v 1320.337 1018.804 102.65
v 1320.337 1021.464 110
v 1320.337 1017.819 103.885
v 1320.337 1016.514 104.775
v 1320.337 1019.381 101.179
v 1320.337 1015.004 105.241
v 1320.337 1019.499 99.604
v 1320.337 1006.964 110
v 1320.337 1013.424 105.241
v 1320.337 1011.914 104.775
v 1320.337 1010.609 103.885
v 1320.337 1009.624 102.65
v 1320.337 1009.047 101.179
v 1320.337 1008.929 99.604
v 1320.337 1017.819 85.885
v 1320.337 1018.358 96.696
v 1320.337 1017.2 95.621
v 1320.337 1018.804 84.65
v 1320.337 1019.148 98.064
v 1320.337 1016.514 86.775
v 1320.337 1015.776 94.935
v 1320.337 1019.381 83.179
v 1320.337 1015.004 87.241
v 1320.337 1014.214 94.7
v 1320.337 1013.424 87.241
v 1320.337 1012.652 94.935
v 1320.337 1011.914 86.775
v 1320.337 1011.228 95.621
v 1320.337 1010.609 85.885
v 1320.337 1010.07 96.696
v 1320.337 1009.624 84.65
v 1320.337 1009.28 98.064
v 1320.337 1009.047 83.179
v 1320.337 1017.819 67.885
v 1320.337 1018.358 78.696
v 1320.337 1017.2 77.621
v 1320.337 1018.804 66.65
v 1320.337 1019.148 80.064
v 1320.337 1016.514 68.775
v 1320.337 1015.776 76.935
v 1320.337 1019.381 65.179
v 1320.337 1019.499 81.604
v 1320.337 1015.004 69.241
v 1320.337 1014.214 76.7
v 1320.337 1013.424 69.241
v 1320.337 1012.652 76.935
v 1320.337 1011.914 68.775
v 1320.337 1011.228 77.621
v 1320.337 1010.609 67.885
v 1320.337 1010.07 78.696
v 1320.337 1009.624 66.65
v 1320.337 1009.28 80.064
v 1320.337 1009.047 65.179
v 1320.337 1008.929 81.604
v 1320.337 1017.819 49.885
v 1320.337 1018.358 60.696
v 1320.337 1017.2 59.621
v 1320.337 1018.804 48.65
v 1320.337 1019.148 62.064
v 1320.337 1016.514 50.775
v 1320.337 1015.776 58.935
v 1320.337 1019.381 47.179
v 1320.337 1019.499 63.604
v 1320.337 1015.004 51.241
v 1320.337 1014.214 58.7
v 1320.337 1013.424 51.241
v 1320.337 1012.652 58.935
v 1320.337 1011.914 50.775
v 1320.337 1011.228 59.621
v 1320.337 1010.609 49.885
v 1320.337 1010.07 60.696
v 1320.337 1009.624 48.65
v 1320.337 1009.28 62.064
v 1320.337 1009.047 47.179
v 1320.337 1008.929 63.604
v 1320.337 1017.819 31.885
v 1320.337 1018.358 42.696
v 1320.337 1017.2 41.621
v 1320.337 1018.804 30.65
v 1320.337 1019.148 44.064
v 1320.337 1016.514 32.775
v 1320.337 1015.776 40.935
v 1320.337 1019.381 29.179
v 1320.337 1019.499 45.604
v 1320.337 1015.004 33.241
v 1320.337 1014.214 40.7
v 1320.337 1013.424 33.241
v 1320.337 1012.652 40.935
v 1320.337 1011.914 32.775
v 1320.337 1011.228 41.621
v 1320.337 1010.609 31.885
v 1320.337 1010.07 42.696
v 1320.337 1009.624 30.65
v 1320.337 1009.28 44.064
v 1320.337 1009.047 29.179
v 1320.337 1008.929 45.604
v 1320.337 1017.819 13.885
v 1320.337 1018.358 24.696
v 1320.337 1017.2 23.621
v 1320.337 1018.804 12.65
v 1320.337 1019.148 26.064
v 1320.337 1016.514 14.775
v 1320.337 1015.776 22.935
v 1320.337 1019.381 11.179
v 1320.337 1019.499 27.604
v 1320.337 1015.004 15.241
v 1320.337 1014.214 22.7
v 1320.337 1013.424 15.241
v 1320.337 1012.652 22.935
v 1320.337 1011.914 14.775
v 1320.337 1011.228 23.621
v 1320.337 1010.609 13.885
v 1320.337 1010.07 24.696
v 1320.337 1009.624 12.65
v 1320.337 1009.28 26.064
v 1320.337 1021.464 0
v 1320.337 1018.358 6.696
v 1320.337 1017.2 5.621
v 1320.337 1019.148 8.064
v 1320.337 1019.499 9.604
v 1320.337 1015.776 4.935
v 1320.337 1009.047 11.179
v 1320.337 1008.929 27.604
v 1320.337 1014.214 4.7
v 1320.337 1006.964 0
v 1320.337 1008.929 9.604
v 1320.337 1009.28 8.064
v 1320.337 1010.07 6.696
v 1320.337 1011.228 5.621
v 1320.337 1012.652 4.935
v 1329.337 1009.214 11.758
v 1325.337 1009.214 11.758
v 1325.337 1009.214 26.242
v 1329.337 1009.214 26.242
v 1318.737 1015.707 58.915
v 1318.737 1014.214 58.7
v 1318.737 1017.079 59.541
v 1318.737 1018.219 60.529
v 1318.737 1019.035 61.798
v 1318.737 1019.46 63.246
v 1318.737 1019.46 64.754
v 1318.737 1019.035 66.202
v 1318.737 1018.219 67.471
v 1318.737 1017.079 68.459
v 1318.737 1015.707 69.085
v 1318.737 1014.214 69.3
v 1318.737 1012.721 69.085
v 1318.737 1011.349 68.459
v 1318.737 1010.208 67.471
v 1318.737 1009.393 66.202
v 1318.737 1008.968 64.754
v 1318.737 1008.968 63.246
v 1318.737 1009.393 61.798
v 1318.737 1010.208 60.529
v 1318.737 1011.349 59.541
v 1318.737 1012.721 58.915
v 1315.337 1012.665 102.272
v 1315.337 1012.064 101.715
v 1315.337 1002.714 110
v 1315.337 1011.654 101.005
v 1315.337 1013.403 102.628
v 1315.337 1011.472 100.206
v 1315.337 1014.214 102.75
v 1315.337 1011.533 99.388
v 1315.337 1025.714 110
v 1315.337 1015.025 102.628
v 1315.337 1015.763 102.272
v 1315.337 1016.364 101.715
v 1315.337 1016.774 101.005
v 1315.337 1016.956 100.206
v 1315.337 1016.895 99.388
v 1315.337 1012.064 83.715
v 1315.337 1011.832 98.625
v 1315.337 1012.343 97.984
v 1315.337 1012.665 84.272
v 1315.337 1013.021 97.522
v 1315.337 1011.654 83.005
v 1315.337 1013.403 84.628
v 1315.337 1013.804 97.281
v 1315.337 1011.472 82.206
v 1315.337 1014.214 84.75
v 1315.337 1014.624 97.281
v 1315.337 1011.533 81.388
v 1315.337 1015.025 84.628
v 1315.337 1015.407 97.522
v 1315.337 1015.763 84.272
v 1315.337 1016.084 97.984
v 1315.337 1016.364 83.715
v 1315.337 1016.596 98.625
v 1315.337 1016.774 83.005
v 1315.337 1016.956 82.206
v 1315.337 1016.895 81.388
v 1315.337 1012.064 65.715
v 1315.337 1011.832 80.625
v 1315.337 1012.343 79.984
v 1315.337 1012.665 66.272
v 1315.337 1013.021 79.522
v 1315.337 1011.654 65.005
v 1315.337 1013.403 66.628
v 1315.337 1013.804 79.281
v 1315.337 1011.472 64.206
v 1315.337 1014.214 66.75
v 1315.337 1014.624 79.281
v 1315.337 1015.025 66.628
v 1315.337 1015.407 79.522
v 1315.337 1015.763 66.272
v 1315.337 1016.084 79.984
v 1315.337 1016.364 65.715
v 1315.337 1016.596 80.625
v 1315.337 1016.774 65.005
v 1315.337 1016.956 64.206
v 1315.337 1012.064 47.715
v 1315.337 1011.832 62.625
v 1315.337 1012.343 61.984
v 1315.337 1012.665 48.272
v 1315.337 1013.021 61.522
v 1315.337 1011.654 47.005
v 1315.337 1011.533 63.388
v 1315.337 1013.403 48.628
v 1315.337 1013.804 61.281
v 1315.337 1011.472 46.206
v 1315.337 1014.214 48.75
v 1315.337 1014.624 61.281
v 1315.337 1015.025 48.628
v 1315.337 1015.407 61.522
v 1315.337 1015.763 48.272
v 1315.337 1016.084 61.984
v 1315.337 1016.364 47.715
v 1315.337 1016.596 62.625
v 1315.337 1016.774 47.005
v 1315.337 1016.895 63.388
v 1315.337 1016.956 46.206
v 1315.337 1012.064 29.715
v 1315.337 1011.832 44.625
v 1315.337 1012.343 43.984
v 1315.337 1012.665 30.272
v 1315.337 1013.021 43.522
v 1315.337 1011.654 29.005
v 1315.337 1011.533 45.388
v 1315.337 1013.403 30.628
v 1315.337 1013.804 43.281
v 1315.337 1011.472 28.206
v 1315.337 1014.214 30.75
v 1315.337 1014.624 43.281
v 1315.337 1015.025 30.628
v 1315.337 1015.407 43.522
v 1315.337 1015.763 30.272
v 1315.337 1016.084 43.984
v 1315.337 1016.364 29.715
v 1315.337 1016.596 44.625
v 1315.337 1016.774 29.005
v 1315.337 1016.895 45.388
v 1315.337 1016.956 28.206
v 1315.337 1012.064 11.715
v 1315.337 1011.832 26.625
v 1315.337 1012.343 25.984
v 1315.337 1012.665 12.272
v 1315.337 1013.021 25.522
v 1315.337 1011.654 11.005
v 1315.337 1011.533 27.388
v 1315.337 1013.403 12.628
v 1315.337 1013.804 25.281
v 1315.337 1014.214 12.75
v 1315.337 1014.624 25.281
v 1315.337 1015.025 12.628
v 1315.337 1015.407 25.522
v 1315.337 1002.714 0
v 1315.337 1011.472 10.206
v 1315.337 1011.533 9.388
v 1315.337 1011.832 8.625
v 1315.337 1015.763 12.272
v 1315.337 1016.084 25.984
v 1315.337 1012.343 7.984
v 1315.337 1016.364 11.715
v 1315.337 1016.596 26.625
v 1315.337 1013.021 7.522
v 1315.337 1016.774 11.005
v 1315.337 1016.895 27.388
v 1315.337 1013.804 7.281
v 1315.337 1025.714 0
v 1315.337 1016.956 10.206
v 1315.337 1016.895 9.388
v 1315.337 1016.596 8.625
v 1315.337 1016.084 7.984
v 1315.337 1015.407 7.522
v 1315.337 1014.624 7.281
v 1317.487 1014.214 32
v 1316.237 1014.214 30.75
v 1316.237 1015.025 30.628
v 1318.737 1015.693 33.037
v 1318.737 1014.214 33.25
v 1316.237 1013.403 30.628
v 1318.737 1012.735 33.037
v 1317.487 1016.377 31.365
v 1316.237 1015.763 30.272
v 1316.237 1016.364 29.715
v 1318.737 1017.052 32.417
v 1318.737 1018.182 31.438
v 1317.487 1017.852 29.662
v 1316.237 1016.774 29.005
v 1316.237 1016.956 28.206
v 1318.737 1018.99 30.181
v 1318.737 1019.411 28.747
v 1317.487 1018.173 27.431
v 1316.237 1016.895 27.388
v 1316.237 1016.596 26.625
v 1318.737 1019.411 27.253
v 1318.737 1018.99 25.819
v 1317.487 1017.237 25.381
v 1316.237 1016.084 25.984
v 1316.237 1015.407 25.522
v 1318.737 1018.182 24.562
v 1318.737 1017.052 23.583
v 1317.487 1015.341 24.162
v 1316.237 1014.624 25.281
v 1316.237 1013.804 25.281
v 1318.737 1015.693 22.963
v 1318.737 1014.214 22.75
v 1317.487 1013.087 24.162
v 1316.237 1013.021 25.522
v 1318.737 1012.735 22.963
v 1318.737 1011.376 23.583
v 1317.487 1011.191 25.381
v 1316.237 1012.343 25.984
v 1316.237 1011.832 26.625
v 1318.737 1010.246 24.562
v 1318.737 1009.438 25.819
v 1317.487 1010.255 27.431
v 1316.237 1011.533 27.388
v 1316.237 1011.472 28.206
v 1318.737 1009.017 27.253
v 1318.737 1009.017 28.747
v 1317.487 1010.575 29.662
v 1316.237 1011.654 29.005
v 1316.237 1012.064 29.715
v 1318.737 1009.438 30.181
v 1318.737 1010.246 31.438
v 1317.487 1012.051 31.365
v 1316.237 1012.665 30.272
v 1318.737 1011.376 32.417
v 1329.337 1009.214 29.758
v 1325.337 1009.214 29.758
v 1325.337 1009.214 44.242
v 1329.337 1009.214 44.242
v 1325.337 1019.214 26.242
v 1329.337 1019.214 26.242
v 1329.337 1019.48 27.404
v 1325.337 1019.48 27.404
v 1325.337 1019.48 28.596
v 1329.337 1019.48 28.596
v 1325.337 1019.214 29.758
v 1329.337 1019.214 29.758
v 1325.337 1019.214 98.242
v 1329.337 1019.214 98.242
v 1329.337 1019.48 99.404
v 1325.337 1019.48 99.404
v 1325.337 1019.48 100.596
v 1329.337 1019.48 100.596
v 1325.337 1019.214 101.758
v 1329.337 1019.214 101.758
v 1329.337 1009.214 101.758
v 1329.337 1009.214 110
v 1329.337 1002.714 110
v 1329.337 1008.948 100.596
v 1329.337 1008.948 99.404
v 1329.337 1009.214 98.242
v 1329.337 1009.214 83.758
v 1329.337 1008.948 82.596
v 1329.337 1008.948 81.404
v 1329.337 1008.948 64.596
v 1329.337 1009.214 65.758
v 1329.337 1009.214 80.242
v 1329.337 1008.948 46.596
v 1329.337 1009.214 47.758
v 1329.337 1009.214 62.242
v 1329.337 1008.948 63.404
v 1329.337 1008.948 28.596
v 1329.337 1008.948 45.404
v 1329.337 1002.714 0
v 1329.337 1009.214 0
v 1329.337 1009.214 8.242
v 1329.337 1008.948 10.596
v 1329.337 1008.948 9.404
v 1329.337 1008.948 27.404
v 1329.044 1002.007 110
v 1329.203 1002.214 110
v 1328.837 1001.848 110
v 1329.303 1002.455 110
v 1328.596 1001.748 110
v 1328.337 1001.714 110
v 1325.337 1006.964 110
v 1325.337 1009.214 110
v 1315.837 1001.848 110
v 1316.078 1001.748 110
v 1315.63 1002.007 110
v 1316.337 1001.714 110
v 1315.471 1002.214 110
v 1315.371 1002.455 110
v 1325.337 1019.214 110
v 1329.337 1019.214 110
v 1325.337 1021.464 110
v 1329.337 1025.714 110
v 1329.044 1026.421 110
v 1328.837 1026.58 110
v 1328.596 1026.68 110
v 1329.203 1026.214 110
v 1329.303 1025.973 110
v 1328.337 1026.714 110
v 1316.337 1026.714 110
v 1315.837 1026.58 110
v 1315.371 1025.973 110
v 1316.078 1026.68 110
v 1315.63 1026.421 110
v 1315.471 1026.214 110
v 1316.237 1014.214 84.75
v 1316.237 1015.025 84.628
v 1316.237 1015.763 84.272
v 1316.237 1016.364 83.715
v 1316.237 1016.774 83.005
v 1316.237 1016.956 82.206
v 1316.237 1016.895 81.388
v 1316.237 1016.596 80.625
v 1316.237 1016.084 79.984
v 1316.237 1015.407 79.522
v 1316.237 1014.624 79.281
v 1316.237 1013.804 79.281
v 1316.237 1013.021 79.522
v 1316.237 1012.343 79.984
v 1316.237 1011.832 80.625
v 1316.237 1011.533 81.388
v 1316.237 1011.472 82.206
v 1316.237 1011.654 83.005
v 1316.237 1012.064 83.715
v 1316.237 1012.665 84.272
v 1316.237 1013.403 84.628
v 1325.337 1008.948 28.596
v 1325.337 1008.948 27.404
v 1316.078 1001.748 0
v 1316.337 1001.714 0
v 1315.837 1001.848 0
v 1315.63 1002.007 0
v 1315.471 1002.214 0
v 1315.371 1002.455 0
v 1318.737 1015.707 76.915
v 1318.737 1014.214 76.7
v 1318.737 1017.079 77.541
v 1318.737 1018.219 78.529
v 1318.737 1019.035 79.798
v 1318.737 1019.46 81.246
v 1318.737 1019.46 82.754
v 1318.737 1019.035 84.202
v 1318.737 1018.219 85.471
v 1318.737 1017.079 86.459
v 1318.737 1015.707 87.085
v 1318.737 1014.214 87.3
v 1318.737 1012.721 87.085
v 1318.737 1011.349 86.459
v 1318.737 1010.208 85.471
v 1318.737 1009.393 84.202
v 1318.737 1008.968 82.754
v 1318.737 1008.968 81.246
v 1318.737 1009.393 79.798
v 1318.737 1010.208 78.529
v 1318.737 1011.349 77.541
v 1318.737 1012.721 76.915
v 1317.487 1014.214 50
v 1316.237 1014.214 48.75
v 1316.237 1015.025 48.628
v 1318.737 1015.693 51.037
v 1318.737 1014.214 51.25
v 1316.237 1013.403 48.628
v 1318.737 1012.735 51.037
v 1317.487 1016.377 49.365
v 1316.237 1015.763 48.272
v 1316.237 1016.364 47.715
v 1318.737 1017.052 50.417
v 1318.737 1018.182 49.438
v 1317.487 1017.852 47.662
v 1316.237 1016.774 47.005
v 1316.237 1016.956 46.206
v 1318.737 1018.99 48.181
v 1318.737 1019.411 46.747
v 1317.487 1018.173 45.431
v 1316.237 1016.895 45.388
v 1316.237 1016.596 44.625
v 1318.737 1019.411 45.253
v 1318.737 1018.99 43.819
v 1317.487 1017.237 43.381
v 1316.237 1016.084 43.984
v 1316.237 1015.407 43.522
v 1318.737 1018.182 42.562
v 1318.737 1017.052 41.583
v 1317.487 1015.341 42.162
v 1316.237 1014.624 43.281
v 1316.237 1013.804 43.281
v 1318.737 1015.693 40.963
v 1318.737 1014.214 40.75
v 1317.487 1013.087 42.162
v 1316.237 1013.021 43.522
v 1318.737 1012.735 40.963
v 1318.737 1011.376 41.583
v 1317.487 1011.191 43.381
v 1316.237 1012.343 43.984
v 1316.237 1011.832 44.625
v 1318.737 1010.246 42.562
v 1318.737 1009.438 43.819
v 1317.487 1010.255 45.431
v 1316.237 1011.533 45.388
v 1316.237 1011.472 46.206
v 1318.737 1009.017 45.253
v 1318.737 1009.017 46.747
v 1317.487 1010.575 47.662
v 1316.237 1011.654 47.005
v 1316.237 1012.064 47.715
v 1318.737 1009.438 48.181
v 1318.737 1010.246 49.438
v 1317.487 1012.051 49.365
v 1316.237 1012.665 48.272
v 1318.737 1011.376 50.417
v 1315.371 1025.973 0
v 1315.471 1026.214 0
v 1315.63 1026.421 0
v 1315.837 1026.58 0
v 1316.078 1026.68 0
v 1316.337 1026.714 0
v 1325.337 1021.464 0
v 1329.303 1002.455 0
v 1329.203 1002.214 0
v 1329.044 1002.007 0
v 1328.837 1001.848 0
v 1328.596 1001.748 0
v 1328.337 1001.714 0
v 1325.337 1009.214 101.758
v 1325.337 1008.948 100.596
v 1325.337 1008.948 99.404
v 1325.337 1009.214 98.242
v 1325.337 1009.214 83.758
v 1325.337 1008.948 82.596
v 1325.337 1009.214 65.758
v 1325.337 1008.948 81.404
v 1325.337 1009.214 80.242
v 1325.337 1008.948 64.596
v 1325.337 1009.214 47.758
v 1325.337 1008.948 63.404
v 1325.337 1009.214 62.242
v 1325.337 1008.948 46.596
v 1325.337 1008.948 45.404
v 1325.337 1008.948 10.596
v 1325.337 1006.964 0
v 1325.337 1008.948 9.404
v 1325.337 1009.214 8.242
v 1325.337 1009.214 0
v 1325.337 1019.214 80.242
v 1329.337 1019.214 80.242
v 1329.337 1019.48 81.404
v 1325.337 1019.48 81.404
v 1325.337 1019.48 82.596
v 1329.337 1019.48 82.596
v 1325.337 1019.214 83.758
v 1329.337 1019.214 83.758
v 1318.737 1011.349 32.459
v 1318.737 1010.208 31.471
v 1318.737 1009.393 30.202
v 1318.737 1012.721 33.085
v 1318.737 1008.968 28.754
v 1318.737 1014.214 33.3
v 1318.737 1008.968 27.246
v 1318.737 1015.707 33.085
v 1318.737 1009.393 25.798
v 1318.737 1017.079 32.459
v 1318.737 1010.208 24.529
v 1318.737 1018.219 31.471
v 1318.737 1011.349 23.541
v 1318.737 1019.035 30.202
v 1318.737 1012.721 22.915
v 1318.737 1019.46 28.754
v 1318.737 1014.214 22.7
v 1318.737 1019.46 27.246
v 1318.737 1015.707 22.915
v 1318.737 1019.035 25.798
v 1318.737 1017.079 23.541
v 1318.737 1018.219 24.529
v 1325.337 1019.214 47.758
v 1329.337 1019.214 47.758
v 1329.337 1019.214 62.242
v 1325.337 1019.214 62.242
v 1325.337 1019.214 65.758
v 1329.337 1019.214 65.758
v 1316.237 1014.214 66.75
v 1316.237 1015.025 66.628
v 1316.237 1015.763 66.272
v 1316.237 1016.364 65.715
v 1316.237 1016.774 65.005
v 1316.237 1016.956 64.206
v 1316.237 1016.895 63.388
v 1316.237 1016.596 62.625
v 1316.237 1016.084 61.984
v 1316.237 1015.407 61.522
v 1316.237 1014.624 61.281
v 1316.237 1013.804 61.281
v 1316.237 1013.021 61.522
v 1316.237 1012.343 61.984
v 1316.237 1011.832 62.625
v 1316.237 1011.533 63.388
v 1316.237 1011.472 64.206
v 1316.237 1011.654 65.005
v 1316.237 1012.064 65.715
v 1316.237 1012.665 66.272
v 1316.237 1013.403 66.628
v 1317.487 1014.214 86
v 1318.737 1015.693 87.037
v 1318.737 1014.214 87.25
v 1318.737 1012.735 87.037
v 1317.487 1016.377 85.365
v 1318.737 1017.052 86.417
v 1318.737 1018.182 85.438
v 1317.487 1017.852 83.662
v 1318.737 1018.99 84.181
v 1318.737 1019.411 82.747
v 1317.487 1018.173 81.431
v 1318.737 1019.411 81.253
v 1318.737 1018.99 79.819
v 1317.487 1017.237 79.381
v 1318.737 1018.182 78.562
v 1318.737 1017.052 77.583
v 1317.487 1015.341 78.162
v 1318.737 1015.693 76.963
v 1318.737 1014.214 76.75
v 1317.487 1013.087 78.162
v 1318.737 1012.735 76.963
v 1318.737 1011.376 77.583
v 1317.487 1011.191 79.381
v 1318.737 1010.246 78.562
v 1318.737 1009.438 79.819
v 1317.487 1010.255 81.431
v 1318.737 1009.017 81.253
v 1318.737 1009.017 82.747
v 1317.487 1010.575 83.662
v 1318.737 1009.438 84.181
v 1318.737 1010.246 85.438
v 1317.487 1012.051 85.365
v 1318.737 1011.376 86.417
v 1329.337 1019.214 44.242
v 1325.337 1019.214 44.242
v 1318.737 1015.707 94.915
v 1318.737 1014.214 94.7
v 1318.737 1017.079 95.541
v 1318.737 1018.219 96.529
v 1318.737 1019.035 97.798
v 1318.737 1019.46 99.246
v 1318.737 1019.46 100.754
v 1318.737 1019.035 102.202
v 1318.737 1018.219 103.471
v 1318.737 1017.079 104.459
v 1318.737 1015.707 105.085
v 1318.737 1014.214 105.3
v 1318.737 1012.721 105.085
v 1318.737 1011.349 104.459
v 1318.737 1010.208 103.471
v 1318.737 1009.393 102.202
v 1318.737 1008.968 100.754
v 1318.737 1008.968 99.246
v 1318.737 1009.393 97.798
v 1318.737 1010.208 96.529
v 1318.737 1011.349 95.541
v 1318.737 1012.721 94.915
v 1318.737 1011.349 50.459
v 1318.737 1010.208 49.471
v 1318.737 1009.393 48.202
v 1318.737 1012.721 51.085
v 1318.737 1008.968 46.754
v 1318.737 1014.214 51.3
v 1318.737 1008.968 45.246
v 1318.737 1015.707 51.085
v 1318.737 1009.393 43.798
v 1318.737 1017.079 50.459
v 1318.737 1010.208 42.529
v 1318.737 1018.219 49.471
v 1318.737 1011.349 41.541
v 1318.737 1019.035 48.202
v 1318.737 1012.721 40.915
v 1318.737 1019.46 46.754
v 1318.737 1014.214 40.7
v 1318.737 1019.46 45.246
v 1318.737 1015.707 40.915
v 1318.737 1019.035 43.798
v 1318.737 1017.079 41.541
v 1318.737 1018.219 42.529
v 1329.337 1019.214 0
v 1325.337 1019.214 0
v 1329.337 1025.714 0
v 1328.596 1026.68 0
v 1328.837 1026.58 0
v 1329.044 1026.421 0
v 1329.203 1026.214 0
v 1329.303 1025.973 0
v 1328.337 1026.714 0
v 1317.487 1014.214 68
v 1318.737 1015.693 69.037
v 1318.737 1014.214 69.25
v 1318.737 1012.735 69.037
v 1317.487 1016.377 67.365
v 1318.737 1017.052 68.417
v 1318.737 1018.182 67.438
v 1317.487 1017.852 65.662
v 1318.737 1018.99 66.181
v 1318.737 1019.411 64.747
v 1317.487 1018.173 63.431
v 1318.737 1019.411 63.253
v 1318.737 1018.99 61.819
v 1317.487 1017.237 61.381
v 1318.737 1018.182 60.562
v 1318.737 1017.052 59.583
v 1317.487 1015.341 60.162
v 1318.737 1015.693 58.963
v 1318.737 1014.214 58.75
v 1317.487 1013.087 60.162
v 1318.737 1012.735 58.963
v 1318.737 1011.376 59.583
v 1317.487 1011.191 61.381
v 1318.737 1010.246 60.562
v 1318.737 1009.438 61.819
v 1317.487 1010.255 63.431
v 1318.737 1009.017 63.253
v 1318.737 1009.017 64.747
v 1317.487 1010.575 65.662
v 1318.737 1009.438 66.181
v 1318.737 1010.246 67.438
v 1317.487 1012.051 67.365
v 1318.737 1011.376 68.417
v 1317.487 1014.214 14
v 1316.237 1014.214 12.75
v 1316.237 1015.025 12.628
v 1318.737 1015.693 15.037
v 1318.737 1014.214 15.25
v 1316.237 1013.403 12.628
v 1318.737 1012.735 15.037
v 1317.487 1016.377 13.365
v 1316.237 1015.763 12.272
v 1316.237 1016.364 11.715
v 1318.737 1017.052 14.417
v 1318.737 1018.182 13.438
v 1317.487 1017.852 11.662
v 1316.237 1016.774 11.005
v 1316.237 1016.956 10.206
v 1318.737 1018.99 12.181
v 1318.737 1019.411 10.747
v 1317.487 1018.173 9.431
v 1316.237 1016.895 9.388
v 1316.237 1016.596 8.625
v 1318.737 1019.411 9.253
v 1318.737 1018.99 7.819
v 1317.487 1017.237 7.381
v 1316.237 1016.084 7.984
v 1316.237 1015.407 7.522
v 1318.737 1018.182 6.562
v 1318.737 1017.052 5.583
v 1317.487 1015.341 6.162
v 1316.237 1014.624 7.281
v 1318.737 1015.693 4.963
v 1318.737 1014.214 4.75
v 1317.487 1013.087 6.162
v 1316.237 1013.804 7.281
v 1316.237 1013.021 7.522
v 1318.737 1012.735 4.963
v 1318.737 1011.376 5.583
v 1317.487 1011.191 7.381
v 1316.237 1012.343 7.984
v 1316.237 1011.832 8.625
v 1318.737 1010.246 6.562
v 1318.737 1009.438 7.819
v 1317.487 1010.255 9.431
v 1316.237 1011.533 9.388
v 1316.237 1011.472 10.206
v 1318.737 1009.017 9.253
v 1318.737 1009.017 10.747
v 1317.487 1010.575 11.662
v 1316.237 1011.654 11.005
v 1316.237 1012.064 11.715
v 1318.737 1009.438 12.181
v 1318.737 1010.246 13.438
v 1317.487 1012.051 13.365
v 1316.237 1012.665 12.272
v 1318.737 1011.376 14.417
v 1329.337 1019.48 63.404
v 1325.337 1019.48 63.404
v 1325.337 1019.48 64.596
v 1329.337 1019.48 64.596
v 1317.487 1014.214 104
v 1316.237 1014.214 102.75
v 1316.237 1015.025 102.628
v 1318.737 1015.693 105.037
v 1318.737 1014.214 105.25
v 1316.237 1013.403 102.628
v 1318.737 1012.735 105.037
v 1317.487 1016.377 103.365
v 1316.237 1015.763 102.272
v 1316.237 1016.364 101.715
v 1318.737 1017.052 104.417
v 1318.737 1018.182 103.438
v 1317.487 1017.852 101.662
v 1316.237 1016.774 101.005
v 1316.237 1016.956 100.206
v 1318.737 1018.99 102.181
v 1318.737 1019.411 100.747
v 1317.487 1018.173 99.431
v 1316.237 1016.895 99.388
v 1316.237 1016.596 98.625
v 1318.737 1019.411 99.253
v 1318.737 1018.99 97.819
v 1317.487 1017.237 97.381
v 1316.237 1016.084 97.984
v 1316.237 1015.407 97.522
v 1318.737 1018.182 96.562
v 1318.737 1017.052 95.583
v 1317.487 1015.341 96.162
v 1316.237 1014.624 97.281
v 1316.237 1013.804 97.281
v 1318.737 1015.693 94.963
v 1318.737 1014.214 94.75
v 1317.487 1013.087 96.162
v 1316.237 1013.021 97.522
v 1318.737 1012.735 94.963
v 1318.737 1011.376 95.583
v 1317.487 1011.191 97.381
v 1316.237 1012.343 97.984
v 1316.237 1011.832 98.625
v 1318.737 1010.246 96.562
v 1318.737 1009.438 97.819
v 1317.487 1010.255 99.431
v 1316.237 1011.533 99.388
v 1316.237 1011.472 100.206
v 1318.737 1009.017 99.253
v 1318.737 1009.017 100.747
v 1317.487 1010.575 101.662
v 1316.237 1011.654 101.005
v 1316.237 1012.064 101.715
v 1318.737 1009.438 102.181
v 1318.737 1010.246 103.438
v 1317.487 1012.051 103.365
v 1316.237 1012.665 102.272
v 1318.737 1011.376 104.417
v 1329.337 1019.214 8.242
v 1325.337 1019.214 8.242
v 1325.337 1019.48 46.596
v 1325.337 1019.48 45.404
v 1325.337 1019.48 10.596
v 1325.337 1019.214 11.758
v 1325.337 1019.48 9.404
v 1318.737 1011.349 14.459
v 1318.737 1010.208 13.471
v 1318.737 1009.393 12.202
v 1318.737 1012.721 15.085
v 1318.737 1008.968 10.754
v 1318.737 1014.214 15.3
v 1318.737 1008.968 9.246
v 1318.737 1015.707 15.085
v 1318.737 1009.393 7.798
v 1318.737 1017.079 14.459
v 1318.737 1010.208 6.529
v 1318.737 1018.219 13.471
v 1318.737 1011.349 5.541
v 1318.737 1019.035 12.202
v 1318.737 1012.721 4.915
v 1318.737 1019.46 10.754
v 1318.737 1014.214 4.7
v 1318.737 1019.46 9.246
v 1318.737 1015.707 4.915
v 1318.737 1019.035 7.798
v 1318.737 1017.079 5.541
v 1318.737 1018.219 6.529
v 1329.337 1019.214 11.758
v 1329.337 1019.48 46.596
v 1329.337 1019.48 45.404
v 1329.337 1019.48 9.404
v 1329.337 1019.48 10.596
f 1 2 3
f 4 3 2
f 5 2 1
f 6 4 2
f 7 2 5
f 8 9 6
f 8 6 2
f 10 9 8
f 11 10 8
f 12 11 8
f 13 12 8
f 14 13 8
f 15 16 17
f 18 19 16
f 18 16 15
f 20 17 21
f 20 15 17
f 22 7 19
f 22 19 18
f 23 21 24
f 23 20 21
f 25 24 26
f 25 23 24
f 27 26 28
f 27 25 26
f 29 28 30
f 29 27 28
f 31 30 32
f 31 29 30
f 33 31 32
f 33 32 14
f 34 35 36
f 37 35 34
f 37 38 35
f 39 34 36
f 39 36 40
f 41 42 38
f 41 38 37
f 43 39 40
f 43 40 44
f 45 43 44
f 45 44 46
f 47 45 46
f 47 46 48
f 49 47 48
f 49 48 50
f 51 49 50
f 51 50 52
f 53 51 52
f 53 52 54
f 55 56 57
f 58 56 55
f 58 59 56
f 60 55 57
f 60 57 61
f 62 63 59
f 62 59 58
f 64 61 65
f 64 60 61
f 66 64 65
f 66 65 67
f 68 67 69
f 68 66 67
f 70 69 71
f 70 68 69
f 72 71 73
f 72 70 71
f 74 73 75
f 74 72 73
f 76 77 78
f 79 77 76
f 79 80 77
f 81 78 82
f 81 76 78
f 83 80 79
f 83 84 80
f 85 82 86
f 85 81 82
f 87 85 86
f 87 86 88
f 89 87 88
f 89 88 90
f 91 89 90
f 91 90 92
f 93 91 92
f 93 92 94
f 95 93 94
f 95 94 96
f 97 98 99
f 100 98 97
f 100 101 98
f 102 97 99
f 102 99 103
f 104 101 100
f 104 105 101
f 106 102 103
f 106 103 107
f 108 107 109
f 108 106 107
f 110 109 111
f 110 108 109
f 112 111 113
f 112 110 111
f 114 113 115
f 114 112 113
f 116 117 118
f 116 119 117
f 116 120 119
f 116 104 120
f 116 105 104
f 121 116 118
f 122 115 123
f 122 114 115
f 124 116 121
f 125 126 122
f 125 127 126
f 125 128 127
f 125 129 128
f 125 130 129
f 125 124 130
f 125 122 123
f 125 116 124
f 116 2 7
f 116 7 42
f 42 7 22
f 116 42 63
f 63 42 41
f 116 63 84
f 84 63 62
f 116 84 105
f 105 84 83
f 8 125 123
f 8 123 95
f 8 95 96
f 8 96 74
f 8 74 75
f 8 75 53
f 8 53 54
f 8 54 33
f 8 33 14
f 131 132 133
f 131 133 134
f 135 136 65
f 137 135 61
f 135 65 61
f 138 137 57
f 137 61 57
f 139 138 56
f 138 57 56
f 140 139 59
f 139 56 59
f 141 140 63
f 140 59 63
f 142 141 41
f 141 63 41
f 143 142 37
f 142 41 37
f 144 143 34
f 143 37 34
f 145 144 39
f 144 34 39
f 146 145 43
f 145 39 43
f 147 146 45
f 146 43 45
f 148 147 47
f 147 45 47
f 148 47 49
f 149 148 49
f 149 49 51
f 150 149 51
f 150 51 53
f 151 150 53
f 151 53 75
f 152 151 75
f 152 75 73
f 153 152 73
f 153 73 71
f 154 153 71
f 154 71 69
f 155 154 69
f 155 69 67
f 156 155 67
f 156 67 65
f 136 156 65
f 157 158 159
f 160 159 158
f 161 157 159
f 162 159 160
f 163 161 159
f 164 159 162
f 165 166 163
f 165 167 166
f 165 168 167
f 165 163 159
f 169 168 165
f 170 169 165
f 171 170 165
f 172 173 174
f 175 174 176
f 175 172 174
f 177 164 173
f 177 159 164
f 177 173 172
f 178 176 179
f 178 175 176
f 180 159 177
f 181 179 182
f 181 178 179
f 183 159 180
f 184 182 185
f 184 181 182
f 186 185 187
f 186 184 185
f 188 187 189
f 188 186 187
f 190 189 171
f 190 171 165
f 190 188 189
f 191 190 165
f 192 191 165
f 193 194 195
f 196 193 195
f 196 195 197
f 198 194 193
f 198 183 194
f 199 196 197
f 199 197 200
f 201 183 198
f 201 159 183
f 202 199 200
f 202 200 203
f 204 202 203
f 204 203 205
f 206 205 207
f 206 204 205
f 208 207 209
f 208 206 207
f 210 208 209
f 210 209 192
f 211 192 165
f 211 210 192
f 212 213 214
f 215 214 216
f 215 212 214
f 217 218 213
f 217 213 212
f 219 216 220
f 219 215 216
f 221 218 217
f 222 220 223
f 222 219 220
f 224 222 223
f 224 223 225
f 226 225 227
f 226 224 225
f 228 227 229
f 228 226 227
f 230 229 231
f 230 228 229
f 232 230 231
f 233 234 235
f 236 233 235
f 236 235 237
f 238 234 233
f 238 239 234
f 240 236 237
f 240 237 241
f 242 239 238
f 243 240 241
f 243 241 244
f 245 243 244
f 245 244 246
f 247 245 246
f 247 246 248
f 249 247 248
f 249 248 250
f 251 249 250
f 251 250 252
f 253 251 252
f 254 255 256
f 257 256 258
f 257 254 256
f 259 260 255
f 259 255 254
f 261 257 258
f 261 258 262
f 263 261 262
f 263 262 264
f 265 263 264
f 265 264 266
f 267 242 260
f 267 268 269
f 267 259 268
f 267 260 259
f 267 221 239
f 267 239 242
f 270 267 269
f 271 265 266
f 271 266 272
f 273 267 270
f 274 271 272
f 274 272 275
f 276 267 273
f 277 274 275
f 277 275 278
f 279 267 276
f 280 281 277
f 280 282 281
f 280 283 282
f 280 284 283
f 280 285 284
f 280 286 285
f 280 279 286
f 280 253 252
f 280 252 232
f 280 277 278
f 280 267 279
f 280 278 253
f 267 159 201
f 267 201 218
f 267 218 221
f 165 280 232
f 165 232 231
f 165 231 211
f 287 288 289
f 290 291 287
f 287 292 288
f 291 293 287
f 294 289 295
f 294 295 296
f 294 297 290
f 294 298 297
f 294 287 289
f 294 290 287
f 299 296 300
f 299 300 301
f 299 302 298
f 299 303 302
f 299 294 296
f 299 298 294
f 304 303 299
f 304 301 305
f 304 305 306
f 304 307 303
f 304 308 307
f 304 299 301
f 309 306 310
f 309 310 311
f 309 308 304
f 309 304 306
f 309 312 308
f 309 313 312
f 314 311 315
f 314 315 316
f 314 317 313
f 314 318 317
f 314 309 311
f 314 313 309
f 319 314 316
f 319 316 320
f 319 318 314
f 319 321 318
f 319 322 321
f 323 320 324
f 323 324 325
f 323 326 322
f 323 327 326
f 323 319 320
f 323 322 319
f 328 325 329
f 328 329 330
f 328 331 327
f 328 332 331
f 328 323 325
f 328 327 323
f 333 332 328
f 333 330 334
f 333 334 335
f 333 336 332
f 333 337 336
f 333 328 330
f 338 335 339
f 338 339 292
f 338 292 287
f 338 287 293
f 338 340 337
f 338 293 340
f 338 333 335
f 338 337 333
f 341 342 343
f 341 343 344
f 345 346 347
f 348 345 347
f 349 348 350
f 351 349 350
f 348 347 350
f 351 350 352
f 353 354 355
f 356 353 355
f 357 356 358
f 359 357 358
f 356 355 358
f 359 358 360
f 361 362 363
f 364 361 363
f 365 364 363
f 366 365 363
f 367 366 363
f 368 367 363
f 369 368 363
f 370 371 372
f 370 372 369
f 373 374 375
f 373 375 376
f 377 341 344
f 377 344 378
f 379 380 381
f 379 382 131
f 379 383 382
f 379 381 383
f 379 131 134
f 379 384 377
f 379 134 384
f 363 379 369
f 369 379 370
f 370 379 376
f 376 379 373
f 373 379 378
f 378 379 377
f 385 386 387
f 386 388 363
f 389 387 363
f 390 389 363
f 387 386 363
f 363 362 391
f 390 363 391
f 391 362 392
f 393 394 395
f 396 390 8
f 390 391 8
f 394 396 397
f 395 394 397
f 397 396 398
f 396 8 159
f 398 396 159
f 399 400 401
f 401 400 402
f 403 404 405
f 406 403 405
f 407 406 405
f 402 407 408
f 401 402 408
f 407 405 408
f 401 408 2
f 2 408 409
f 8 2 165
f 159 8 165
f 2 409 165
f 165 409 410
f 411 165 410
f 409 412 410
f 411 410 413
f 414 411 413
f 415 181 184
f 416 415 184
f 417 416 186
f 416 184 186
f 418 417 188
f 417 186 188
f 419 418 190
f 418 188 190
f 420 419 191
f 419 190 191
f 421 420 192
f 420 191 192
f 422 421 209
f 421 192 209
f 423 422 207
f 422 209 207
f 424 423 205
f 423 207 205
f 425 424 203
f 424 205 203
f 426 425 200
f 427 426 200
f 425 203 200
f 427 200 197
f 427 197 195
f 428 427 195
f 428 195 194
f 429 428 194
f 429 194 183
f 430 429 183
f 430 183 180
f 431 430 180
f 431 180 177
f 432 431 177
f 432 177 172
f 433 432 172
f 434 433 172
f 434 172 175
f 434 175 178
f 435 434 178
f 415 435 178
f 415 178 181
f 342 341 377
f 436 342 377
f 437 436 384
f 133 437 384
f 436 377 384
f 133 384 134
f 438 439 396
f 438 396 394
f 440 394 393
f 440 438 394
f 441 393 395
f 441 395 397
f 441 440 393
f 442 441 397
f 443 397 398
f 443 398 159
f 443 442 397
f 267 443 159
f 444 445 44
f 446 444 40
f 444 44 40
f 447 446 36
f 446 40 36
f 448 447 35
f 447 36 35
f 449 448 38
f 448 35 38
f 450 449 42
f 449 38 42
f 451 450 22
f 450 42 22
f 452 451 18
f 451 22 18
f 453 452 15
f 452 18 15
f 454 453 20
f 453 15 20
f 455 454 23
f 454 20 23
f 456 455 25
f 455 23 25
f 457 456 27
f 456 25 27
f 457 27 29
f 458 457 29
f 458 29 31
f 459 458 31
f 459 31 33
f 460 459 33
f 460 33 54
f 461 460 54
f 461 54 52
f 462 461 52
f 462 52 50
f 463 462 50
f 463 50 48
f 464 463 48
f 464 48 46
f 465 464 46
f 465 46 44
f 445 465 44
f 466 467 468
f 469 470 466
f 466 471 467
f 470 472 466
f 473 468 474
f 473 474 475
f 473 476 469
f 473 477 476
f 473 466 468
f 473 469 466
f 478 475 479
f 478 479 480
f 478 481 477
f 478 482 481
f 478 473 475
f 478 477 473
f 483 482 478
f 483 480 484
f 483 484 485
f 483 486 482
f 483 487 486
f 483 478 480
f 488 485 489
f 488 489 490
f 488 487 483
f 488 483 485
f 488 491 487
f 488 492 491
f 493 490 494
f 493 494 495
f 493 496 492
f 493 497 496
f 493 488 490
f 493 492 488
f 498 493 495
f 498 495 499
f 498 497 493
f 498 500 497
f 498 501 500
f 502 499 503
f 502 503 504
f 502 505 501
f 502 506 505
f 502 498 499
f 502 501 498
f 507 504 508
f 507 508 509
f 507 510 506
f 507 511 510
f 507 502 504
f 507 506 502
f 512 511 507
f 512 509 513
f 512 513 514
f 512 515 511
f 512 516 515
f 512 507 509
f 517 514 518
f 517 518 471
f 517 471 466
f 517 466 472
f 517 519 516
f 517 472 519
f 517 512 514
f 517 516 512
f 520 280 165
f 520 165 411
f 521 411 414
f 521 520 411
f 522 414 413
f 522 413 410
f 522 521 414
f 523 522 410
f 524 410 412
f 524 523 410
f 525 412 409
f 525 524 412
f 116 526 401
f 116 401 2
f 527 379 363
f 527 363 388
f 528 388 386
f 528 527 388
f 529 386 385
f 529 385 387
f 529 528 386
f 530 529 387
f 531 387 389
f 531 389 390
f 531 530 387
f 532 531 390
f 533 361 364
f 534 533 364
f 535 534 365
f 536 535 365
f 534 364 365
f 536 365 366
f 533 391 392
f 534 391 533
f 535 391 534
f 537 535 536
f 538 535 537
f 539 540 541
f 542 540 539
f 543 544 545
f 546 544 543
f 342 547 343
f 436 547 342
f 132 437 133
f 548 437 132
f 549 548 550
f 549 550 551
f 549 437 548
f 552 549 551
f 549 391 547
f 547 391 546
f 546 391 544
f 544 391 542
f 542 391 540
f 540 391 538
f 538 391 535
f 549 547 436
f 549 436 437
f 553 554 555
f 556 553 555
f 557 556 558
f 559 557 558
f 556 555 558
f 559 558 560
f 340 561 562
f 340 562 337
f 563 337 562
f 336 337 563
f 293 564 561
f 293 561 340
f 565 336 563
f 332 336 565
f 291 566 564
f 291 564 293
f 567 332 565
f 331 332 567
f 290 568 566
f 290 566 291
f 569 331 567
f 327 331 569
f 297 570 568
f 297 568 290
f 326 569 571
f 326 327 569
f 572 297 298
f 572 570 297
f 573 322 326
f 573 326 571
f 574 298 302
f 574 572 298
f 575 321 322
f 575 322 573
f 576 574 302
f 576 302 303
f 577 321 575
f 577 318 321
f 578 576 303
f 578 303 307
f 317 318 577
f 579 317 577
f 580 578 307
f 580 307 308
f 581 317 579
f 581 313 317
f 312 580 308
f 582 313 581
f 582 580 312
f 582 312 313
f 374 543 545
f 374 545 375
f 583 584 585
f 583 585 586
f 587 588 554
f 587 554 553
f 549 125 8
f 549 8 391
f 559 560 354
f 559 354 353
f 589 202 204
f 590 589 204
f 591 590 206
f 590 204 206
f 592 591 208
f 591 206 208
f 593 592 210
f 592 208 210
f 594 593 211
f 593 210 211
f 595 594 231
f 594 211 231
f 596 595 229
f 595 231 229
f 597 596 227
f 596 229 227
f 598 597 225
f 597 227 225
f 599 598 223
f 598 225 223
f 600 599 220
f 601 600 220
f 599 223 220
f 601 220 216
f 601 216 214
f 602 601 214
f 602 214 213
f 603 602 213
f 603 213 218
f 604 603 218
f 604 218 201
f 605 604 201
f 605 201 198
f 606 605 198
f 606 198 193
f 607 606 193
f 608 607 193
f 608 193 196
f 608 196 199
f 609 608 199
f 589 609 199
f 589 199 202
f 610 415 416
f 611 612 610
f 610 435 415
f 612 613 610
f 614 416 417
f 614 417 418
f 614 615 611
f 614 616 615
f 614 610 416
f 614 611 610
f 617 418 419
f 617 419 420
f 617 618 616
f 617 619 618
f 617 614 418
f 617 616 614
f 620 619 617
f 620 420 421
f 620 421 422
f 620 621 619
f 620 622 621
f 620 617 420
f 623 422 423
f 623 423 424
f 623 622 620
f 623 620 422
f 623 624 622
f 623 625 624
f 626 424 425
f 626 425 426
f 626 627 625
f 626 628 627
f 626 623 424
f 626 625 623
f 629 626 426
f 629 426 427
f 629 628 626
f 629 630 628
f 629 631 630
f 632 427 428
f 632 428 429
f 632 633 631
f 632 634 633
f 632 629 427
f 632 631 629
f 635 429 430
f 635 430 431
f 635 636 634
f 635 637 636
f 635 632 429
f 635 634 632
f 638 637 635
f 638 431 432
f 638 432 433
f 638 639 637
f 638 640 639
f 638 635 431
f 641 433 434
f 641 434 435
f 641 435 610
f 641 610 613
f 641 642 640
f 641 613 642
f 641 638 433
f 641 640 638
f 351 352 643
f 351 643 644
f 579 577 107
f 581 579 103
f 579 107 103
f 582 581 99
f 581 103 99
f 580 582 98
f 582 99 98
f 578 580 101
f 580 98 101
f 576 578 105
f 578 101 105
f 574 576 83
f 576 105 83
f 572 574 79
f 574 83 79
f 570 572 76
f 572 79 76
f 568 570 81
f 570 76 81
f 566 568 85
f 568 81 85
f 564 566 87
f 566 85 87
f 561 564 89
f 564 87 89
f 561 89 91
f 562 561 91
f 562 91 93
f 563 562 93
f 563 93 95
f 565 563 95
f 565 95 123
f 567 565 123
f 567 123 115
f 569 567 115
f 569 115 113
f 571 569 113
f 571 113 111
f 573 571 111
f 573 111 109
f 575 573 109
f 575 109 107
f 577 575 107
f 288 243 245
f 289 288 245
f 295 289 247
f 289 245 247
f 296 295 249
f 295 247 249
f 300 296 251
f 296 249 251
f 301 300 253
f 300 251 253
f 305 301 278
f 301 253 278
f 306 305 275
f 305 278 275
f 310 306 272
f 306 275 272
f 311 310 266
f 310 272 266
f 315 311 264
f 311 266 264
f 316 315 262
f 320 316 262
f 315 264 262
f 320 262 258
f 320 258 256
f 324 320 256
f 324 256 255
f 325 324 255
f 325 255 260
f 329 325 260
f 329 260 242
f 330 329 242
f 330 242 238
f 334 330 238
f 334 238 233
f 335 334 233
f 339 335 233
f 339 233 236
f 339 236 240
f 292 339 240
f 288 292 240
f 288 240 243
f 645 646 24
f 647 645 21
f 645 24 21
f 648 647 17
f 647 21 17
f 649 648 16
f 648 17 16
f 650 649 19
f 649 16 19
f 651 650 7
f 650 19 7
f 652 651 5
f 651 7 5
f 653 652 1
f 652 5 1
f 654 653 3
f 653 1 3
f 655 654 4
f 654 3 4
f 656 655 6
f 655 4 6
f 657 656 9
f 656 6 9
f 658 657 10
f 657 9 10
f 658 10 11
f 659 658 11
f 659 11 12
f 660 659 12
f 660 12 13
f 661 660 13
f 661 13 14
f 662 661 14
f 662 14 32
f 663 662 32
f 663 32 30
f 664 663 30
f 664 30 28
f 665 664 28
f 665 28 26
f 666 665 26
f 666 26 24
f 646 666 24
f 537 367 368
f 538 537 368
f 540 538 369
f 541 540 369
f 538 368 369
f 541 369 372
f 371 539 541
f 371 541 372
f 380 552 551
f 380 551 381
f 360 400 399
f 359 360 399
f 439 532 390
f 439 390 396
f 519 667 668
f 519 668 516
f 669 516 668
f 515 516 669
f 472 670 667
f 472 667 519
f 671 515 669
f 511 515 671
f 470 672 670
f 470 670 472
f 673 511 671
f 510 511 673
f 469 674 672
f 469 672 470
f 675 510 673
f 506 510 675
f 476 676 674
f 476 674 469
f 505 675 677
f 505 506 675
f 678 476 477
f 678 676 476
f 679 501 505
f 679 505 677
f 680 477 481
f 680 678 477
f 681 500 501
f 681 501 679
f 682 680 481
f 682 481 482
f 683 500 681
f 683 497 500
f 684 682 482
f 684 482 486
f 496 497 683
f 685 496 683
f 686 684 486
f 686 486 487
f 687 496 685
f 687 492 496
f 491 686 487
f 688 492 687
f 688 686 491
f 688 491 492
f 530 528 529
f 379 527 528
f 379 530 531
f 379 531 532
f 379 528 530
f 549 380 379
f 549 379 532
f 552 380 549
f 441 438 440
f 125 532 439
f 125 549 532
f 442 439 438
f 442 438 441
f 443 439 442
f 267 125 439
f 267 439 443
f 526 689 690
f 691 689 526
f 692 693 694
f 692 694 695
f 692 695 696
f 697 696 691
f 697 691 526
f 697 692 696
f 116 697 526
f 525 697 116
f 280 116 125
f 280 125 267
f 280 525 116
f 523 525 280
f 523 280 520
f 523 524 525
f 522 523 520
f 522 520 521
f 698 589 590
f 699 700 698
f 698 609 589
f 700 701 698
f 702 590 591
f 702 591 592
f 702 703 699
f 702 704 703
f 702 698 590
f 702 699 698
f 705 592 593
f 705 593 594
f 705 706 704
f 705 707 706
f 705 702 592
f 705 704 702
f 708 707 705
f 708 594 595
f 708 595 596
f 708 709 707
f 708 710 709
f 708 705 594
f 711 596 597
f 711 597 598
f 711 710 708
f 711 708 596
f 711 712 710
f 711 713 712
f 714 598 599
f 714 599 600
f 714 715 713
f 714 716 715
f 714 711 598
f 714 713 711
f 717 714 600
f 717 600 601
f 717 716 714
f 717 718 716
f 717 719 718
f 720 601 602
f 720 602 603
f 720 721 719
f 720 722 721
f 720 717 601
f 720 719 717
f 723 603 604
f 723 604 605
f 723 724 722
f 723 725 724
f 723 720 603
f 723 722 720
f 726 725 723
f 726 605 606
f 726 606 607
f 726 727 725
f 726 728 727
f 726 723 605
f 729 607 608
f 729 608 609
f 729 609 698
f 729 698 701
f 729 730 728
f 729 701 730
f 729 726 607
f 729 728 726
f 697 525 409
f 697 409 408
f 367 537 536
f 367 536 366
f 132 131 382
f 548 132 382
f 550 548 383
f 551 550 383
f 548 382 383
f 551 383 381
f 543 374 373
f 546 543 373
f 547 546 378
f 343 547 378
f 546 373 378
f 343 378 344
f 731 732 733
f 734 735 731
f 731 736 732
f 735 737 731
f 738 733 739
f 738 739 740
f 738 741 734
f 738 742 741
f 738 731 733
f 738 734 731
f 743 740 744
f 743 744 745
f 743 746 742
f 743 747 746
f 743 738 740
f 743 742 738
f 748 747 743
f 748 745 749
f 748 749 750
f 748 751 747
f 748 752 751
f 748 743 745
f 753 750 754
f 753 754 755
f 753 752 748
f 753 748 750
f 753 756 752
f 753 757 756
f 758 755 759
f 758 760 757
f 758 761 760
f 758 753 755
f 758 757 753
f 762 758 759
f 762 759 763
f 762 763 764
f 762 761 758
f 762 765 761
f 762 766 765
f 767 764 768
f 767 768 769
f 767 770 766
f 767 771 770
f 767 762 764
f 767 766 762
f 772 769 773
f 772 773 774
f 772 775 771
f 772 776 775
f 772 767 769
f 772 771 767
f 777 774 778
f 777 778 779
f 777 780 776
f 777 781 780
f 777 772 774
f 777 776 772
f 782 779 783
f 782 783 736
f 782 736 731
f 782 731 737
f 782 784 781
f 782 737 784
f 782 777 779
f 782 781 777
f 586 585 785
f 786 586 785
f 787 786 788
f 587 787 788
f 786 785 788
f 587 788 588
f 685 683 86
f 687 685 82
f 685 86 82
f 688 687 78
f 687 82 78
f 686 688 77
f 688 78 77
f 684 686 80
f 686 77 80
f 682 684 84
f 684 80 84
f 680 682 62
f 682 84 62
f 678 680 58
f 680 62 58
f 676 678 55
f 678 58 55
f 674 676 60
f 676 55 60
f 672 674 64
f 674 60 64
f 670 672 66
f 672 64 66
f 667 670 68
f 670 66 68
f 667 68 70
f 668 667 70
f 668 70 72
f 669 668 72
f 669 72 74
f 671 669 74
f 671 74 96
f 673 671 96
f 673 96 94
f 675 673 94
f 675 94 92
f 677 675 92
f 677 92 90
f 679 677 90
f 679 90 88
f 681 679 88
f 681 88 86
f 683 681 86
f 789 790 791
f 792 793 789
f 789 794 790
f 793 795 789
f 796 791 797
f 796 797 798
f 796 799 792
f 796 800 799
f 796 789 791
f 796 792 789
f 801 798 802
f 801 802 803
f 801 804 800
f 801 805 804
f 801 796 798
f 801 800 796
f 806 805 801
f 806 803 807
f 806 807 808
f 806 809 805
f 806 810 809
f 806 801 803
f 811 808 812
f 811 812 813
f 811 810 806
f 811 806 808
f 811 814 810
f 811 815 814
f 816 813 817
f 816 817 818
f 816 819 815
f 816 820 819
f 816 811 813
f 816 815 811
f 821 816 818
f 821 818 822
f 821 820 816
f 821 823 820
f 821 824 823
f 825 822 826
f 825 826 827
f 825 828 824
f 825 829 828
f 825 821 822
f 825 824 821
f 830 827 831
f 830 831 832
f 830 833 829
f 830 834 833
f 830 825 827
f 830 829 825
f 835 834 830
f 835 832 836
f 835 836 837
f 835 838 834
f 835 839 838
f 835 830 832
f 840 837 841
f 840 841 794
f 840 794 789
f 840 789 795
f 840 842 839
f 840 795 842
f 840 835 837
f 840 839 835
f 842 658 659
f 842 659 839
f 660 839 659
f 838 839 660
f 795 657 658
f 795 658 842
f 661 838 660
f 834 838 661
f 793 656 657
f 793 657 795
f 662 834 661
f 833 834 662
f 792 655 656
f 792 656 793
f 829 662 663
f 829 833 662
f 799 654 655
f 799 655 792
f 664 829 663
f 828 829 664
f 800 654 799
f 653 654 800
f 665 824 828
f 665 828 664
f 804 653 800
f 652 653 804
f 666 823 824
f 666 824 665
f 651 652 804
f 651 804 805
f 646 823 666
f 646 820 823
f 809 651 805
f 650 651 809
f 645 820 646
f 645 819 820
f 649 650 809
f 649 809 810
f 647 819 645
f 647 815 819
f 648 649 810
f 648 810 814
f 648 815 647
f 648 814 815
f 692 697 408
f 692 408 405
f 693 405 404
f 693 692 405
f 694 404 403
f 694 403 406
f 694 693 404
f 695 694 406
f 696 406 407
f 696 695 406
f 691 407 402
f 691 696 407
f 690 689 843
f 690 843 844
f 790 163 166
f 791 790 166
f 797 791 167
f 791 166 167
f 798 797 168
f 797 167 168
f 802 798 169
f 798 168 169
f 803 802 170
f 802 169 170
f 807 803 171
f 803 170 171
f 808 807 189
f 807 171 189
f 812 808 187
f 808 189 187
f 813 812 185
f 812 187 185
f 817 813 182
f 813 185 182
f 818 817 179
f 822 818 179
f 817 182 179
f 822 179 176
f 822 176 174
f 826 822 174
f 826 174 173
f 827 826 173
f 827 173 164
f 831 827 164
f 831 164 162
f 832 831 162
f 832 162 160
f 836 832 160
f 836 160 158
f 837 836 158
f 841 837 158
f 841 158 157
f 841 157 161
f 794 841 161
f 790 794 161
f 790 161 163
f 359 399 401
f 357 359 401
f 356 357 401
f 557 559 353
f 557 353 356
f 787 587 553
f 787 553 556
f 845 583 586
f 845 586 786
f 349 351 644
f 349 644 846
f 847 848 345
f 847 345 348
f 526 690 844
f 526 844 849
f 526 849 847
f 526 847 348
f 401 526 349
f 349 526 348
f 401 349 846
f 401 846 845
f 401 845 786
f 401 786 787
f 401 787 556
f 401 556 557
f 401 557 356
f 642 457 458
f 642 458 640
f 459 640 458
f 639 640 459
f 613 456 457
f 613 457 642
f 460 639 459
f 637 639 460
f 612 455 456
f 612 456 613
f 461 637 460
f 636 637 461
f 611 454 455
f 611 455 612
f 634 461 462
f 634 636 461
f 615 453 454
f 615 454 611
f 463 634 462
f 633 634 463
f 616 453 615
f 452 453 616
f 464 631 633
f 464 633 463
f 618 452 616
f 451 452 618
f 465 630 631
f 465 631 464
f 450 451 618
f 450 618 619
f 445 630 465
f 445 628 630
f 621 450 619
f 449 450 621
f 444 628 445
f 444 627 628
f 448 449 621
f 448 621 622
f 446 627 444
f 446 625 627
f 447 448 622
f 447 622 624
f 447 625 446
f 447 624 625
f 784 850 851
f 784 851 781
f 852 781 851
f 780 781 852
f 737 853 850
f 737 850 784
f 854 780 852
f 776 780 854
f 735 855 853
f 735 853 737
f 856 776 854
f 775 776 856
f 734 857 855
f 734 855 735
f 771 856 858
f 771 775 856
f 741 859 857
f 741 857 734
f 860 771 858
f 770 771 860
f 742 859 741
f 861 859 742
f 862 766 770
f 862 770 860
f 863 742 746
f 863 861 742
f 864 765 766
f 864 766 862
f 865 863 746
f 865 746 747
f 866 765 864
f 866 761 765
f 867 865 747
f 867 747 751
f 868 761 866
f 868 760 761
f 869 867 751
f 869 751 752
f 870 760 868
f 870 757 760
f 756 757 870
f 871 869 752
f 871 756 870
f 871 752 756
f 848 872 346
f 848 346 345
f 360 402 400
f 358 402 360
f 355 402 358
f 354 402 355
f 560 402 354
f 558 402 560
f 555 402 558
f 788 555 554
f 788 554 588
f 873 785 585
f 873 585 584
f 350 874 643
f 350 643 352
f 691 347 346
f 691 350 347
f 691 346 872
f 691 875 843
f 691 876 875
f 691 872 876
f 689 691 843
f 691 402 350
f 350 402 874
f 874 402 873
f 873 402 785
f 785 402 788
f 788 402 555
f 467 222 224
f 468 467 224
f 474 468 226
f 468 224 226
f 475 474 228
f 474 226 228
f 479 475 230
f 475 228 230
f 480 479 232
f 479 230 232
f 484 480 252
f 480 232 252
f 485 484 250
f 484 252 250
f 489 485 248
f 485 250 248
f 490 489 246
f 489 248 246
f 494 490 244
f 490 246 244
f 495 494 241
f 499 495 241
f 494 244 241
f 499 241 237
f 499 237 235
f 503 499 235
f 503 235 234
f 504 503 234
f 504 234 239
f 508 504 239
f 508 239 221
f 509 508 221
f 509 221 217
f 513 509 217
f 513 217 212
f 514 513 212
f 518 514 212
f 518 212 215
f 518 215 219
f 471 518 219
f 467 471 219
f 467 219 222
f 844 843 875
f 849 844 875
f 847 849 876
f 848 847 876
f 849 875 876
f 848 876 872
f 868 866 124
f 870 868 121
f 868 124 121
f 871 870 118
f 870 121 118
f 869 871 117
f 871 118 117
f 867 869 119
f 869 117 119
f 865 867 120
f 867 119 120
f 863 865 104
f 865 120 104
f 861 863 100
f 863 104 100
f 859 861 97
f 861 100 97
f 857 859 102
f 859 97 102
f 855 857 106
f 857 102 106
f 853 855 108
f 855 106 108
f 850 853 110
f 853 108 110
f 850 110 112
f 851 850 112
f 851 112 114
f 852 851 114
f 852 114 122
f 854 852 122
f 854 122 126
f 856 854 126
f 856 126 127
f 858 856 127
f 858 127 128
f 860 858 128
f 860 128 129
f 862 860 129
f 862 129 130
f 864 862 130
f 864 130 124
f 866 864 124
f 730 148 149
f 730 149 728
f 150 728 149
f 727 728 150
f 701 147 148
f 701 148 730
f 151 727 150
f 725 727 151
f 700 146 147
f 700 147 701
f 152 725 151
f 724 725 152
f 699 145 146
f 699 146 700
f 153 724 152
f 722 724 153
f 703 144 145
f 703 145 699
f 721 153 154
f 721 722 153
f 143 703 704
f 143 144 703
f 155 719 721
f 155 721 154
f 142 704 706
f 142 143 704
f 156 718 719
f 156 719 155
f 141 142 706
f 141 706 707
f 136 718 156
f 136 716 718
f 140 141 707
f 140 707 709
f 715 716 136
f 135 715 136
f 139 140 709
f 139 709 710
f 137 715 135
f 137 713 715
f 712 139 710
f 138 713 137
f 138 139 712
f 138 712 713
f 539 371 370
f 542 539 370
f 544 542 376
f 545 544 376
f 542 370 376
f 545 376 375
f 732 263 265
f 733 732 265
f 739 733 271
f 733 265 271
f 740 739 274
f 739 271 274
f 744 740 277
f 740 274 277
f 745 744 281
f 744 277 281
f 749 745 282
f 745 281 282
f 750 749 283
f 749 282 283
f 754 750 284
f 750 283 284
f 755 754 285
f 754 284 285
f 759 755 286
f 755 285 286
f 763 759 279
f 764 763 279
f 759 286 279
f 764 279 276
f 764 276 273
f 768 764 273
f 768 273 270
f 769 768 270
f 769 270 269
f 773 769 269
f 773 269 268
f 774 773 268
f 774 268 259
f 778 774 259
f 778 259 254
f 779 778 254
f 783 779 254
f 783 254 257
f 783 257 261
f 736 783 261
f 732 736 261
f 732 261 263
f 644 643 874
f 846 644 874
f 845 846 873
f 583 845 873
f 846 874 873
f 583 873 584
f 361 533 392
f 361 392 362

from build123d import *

# Parameters (mm, degrees)
EXTRUDE_1_DEPTH     = 110
SKETCH_2_R          = 2.75
CUT_EXTRUDE_2_DEPTH = 110
SKETCH_3_R          = 5.3
CUT_EXTRUDE_3_DEPTH = 10.6
CHAMFER_1_SIZE      = 2.5
CHAMFER_2_SIZE      = 2.5
CHAMFER_3_SIZE      = 2.5
CHAMFER_4_SIZE      = 2.5
CHAMFER_5_SIZE      = 2.5
CHAMFER_6_SIZE      = 2.5


with BuildPart() as part:
    # 草图1 → 拉伸1 (new body)
    with BuildSketch(Plane.XY):
        with BuildLine():
            Line((1315.337068447, 1002.71396169), (1315.337068447, 1025.71396169))
            ThreePointArc((1315.337068447, 1025.71396169), (1315.629961666, 1026.421068471), (1316.337068447, 1026.71396169))
            Line((1316.337068447, 1026.71396169), (1328.337068447, 1026.71396169))
            ThreePointArc((1328.337068447, 1026.71396169), (1329.044175228, 1026.421068471), (1329.337068447, 1025.71396169))
            Line((1329.337068447, 1025.71396169), (1329.337068447, 1019.21396169))
            Line((1329.337068447, 1019.21396169), (1325.337068447, 1019.21396169))
            Line((1325.337068447, 1019.21396169), (1325.337068447, 1021.46396169))
            Line((1325.337068447, 1021.46396169), (1320.337068447, 1021.46396169))
            Line((1320.337068447, 1021.46396169), (1320.337068447, 1006.96396169))
            Line((1320.337068447, 1006.96396169), (1325.337068447, 1006.96396169))
            Line((1325.337068447, 1006.96396169), (1325.337068447, 1009.21396169))
            Line((1325.337068447, 1009.21396169), (1329.337068447, 1009.21396169))
            Line((1329.337068447, 1009.21396169), (1329.337068447, 1002.71396169))
            ThreePointArc((1329.337068447, 1002.71396169), (1329.044175228, 1002.006854909), (1328.337068447, 1001.71396169))
            Line((1328.337068447, 1001.71396169), (1316.337068447, 1001.71396169))
            ThreePointArc((1316.337068447, 1001.71396169), (1315.629961666, 1002.006854909), (1315.337068447, 1002.71396169))
        make_face()
    extrude(amount=EXTRUDE_1_DEPTH)

    # 草图2 → 拉伸2 (cut)
    with BuildSketch(Plane.ZY.offset(-1315.337068447)):
        with Locations((100, 1014.21396169)):
            Circle(SKETCH_2_R)
        with Locations((82, 1014.21396169)):
            Circle(SKETCH_2_R)
        with Locations((64, 1014.21396169)):
            Circle(SKETCH_2_R)
        with Locations((46, 1014.21396169)):
            Circle(SKETCH_2_R)
        with Locations((28, 1014.21396169)):
            Circle(SKETCH_2_R)
        with Locations((10, 1014.21396169)):
            Circle(SKETCH_2_R)
    extrude(amount=-CUT_EXTRUDE_2_DEPTH, mode=Mode.SUBTRACT)

    # 草图3 → 拉伸3 (cut)
    with BuildSketch(Plane(origin=(1329.337068447, 0, 0), x_dir=(0, 0, -1), z_dir=(1, 0, 0))):
        with Locations((-100, 1014.21396169)):
            Circle(SKETCH_3_R)
        with Locations((-82, 1014.21396169)):
            Circle(SKETCH_3_R)
        with Locations((-64, 1014.21396169)):
            Circle(SKETCH_3_R)
        with Locations((-46, 1014.21396169)):
            Circle(SKETCH_3_R)
        with Locations((-28, 1014.21396169)):
            Circle(SKETCH_3_R)
        with Locations((-10, 1014.21396169)):
            Circle(SKETCH_3_R)
    extrude(amount=-CUT_EXTRUDE_3_DEPTH, mode=Mode.SUBTRACT)

    # 倒角1
    chamfer_1_edges = [part.edges().sort_by_distance(p)[0] for p in [
        (1318.737068447, 1014.21396169, 97.25),
    ]]
    chamfer(chamfer_1_edges, length=CHAMFER_1_SIZE)

    # 倒角2
    chamfer_2_edges = [part.edges().sort_by_distance(p)[0] for p in [
        (1318.737068447, 1014.21396169, 79.25),
    ]]
    chamfer(chamfer_2_edges, length=CHAMFER_2_SIZE)

    # 倒角3
    chamfer_3_edges = [part.edges().sort_by_distance(p)[0] for p in [
        (1318.737068447, 1014.21396169, 61.25),
    ]]
    chamfer(chamfer_3_edges, length=CHAMFER_3_SIZE)

    # 倒角4
    chamfer_4_edges = [part.edges().sort_by_distance(p)[0] for p in [
        (1318.737068447, 1014.21396169, 43.25),
    ]]
    chamfer(chamfer_4_edges, length=CHAMFER_4_SIZE)

    # 倒角5
    chamfer_5_edges = [part.edges().sort_by_distance(p)[0] for p in [
        (1318.737068447, 1014.21396169, 25.25),
    ]]
    chamfer(chamfer_5_edges, length=CHAMFER_5_SIZE)

    # 倒角6
    chamfer_6_edges = [part.edges().sort_by_distance(p)[0] for p in [
        (1318.737068447, 1014.21396169, 7.25),
    ]]
    chamfer(chamfer_6_edges, length=CHAMFER_6_SIZE)


solid = part.part
